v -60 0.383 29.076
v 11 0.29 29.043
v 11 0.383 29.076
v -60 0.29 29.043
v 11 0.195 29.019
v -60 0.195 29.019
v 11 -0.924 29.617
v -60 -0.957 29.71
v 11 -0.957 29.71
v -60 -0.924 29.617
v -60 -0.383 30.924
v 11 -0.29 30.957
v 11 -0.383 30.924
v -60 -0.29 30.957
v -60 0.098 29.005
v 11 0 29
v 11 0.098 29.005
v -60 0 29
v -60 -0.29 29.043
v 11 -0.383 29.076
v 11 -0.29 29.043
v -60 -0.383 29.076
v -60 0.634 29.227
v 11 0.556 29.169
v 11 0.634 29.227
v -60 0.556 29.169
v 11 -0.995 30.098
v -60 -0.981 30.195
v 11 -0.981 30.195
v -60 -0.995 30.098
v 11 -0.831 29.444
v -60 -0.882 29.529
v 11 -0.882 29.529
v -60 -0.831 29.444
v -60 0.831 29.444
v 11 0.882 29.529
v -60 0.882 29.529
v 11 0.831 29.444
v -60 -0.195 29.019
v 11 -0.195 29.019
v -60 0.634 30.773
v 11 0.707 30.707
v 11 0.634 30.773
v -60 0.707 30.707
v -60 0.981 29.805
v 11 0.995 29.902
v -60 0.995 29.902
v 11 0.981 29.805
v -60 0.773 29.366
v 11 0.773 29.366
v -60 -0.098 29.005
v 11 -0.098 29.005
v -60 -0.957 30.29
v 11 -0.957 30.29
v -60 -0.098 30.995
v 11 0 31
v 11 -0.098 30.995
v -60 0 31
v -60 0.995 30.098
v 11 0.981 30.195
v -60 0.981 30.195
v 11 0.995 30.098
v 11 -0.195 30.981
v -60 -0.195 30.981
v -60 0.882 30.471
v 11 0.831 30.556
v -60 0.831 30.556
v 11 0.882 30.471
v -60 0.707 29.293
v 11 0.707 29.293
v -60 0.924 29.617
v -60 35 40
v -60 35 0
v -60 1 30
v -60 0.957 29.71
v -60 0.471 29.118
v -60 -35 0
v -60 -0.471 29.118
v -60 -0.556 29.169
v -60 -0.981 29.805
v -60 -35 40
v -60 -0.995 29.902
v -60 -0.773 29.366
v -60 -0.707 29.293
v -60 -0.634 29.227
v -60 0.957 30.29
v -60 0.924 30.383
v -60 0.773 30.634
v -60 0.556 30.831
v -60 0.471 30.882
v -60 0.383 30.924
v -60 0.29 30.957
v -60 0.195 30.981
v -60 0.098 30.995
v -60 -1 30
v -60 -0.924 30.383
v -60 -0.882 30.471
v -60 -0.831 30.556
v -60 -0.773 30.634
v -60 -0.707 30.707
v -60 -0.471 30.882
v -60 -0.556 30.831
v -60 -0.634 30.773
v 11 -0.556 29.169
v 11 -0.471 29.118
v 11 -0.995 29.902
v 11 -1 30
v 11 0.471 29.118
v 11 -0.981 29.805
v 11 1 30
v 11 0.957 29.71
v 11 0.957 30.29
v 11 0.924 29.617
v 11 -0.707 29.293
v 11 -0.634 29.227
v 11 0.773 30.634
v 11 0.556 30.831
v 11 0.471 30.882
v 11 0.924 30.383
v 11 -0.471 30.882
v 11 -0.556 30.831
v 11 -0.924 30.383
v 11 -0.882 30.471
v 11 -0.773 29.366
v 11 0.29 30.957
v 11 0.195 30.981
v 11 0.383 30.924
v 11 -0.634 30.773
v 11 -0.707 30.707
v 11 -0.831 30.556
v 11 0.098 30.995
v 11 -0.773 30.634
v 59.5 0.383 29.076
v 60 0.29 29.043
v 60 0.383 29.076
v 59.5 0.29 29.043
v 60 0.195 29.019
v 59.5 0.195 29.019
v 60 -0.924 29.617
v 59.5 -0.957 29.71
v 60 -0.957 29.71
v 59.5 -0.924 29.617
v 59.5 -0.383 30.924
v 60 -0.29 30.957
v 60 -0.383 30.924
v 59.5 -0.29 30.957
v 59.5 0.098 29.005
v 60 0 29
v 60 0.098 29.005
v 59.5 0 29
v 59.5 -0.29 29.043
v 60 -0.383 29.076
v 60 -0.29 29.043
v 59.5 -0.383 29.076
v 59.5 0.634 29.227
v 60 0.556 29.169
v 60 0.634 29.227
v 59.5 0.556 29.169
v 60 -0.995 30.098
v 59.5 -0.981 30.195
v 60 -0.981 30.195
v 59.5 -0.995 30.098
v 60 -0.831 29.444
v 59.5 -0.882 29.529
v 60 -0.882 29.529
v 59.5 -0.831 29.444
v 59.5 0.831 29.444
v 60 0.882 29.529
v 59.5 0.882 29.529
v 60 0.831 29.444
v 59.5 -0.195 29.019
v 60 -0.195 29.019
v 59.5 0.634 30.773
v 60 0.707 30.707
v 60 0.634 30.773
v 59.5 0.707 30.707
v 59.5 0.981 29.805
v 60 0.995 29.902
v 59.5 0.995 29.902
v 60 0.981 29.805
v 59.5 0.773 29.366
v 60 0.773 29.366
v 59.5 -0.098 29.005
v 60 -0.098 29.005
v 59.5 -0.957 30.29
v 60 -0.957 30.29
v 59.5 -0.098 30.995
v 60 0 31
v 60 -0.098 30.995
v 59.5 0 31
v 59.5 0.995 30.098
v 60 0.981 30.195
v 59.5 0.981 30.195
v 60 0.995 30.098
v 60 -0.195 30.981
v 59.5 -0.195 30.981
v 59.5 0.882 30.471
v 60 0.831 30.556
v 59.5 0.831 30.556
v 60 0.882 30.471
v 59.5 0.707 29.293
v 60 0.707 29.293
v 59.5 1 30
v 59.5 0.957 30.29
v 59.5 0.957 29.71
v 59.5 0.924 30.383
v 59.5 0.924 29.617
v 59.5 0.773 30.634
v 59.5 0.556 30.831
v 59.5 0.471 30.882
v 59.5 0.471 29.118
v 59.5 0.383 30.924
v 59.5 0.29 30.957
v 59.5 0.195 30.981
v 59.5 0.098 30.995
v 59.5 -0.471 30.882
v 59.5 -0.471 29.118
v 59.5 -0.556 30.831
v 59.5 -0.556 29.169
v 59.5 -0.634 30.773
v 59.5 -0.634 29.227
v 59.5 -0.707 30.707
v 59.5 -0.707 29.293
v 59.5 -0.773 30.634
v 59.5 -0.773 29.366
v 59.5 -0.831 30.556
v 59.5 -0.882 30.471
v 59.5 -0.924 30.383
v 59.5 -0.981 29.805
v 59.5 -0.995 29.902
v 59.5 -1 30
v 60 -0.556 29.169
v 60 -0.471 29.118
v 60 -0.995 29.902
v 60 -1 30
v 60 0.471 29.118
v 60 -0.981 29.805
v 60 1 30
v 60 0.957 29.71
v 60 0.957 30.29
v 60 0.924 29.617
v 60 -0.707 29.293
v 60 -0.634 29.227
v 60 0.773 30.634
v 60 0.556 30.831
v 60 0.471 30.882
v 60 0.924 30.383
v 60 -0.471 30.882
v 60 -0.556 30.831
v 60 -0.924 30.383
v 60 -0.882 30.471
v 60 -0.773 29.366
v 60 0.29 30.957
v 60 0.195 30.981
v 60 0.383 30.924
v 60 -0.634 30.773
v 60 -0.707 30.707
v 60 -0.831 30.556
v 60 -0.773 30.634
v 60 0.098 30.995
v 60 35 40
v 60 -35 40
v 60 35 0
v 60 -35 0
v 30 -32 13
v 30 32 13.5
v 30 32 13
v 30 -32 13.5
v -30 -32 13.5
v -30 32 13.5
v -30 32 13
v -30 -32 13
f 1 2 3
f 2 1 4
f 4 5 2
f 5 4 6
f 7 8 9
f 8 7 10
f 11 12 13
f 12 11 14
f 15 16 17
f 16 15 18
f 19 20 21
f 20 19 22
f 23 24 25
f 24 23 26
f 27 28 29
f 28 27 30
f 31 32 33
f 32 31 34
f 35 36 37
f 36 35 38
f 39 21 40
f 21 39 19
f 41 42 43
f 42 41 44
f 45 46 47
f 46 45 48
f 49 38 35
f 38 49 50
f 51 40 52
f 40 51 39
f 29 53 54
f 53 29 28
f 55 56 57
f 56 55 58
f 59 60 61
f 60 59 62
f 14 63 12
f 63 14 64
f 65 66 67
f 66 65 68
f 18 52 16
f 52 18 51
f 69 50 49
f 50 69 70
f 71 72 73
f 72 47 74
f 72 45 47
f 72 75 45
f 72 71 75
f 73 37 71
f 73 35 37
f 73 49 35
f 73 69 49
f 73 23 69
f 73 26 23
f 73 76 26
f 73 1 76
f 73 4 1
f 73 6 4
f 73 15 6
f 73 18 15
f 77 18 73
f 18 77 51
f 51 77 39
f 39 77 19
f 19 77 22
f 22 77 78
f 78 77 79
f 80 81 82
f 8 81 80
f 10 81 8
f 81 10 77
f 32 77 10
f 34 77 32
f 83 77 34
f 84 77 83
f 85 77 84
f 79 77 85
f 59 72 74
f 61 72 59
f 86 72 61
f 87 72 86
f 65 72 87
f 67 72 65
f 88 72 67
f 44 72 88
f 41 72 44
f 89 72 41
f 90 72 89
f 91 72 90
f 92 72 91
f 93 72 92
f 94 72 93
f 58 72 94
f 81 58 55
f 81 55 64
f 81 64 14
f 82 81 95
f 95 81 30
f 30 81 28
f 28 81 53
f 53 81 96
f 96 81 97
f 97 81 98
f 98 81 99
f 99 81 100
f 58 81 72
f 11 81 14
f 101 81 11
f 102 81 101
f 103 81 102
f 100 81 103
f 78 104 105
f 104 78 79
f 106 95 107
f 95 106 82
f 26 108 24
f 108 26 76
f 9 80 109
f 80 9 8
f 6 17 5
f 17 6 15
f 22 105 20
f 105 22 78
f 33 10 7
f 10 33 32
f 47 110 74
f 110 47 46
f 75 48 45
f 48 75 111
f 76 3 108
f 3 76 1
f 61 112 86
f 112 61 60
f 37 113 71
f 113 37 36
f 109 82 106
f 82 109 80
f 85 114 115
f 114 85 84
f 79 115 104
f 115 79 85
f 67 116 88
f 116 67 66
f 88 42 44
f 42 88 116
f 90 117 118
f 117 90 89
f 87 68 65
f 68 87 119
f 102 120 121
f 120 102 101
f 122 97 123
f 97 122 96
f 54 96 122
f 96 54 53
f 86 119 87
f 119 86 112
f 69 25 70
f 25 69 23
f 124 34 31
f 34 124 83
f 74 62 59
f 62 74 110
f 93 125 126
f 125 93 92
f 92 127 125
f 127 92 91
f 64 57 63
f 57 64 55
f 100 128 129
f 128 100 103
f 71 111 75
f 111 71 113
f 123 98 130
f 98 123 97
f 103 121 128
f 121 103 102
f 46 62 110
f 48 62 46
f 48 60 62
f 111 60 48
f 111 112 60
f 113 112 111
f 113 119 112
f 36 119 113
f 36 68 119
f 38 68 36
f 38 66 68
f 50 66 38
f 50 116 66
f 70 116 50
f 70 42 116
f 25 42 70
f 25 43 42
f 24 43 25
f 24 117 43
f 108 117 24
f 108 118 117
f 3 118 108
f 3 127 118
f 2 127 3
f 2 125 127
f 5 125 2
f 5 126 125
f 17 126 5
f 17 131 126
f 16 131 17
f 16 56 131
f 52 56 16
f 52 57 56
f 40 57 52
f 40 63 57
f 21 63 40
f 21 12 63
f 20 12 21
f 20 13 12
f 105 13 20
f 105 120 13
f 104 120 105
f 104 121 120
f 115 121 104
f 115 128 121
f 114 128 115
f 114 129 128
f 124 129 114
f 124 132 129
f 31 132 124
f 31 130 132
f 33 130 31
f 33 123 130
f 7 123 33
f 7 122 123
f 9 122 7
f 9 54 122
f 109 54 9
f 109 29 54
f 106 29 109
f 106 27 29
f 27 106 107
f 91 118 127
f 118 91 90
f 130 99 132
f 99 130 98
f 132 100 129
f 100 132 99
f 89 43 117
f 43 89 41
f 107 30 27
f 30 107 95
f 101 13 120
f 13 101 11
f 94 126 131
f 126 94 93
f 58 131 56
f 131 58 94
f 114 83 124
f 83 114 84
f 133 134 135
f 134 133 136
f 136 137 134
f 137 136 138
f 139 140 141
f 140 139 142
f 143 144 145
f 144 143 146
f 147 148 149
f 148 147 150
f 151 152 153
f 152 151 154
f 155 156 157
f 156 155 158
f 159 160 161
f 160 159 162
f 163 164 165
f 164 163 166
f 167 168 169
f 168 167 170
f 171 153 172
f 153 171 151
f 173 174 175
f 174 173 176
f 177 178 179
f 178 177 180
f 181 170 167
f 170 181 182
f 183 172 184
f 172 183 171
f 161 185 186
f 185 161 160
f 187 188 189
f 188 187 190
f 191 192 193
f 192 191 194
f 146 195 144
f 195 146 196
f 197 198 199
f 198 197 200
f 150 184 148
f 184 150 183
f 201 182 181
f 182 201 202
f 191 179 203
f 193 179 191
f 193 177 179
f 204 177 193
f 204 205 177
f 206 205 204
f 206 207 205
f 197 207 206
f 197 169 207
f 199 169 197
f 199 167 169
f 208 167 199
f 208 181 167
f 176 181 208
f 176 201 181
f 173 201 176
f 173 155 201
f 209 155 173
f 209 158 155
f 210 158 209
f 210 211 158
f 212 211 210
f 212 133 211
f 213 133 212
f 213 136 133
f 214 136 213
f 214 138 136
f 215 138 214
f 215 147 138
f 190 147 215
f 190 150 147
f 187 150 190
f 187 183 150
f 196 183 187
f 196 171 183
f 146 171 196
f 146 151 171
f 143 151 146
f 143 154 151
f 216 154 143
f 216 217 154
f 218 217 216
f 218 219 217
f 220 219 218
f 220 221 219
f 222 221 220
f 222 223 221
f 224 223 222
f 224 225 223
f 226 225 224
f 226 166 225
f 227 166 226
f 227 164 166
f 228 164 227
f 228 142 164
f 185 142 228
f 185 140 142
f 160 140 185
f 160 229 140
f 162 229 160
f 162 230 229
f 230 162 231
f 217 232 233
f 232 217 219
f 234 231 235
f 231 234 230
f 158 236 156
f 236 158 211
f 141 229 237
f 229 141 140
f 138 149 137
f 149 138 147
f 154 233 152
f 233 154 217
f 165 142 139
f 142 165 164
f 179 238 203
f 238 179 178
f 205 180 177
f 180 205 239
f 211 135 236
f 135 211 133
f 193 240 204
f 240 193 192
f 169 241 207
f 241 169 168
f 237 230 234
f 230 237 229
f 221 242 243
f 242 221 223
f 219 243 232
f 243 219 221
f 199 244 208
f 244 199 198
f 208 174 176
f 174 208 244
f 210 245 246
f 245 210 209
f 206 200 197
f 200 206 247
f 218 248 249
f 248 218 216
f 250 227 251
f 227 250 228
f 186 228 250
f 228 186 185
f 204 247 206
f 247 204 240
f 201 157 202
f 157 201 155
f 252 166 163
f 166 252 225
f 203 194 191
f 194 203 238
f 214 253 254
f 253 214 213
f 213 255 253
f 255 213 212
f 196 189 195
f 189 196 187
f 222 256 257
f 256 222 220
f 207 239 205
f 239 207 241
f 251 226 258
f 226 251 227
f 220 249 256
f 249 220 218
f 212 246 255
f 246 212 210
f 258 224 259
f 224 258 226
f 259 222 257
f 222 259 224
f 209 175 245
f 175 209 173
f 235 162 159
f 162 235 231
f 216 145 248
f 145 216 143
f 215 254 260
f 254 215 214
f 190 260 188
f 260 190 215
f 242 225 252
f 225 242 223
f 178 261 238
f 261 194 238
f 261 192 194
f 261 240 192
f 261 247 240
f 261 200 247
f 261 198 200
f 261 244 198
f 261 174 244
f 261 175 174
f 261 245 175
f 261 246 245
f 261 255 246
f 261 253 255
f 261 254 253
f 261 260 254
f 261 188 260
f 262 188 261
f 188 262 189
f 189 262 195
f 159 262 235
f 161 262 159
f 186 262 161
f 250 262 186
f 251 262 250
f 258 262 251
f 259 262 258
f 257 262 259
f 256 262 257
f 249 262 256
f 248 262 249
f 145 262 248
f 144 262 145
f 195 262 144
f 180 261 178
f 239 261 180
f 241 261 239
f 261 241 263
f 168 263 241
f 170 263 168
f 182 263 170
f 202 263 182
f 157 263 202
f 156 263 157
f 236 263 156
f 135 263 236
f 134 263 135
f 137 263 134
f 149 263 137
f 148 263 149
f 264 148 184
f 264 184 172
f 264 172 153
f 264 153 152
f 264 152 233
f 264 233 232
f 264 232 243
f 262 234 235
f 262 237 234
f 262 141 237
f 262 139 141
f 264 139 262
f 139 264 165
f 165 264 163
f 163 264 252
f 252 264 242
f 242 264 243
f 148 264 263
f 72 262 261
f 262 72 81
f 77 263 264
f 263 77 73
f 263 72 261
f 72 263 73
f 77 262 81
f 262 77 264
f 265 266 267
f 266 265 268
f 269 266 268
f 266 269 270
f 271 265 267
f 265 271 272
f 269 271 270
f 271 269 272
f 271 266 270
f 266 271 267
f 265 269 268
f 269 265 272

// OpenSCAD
// Mini horizontal gel-electrophoresis buffer tank
// Print orientation: base on XY plane, open top, builds up +Z

// ---- Tank dimensions ----
outer_x = 120;   // outer length along X
outer_y = 70;    // outer width along Y
height  = 40;    // outer height along Z
wall    = 3;     // wall thickness
floor   = 3;     // floor thickness

// ---- Platform dimensions ----
plat_len   = 60;  // platform length along X (centred)
plat_top_z = 13;  // platform top height above inner floor

// ---- Electrode holes ----
hole_d = 2;       // hole diameter
hole_y = 0;       // hole Y position
hole_z = 30;      // hole Z position

// ---- Misc ----
eps = 0.5;        // cutter overshoot past faces
$fn = 64;

// ---- Derived ----
inner_x = outer_x - 2 * wall;   // 114
inner_y = outer_y - 2 * wall;   // 64
inner_f = floor + (plat_top_z - floor); // platform bottom height (6)

difference() {
    // Tank body
    translate([-outer_x/2, -outer_y/2, 0])
        cube([outer_x, outer_y, height]);

    // Raised platform (spans full inner width Y)
    translate([-plat_len/2, -inner_y/2, inner_f])
        cube([plat_len, inner_y, plat_top_z - inner_f + eps]);

    // Electrode holes through end walls, along X
    for (sx = [-1, 1])
        translate([sx > 0 ? outer_x/2 - eps : -outer_x/2, hole_y, hole_z])
            rotate([0, 90, 0])
                cylinder(d = hole_d, h = outer_y + 2*eps);
}
